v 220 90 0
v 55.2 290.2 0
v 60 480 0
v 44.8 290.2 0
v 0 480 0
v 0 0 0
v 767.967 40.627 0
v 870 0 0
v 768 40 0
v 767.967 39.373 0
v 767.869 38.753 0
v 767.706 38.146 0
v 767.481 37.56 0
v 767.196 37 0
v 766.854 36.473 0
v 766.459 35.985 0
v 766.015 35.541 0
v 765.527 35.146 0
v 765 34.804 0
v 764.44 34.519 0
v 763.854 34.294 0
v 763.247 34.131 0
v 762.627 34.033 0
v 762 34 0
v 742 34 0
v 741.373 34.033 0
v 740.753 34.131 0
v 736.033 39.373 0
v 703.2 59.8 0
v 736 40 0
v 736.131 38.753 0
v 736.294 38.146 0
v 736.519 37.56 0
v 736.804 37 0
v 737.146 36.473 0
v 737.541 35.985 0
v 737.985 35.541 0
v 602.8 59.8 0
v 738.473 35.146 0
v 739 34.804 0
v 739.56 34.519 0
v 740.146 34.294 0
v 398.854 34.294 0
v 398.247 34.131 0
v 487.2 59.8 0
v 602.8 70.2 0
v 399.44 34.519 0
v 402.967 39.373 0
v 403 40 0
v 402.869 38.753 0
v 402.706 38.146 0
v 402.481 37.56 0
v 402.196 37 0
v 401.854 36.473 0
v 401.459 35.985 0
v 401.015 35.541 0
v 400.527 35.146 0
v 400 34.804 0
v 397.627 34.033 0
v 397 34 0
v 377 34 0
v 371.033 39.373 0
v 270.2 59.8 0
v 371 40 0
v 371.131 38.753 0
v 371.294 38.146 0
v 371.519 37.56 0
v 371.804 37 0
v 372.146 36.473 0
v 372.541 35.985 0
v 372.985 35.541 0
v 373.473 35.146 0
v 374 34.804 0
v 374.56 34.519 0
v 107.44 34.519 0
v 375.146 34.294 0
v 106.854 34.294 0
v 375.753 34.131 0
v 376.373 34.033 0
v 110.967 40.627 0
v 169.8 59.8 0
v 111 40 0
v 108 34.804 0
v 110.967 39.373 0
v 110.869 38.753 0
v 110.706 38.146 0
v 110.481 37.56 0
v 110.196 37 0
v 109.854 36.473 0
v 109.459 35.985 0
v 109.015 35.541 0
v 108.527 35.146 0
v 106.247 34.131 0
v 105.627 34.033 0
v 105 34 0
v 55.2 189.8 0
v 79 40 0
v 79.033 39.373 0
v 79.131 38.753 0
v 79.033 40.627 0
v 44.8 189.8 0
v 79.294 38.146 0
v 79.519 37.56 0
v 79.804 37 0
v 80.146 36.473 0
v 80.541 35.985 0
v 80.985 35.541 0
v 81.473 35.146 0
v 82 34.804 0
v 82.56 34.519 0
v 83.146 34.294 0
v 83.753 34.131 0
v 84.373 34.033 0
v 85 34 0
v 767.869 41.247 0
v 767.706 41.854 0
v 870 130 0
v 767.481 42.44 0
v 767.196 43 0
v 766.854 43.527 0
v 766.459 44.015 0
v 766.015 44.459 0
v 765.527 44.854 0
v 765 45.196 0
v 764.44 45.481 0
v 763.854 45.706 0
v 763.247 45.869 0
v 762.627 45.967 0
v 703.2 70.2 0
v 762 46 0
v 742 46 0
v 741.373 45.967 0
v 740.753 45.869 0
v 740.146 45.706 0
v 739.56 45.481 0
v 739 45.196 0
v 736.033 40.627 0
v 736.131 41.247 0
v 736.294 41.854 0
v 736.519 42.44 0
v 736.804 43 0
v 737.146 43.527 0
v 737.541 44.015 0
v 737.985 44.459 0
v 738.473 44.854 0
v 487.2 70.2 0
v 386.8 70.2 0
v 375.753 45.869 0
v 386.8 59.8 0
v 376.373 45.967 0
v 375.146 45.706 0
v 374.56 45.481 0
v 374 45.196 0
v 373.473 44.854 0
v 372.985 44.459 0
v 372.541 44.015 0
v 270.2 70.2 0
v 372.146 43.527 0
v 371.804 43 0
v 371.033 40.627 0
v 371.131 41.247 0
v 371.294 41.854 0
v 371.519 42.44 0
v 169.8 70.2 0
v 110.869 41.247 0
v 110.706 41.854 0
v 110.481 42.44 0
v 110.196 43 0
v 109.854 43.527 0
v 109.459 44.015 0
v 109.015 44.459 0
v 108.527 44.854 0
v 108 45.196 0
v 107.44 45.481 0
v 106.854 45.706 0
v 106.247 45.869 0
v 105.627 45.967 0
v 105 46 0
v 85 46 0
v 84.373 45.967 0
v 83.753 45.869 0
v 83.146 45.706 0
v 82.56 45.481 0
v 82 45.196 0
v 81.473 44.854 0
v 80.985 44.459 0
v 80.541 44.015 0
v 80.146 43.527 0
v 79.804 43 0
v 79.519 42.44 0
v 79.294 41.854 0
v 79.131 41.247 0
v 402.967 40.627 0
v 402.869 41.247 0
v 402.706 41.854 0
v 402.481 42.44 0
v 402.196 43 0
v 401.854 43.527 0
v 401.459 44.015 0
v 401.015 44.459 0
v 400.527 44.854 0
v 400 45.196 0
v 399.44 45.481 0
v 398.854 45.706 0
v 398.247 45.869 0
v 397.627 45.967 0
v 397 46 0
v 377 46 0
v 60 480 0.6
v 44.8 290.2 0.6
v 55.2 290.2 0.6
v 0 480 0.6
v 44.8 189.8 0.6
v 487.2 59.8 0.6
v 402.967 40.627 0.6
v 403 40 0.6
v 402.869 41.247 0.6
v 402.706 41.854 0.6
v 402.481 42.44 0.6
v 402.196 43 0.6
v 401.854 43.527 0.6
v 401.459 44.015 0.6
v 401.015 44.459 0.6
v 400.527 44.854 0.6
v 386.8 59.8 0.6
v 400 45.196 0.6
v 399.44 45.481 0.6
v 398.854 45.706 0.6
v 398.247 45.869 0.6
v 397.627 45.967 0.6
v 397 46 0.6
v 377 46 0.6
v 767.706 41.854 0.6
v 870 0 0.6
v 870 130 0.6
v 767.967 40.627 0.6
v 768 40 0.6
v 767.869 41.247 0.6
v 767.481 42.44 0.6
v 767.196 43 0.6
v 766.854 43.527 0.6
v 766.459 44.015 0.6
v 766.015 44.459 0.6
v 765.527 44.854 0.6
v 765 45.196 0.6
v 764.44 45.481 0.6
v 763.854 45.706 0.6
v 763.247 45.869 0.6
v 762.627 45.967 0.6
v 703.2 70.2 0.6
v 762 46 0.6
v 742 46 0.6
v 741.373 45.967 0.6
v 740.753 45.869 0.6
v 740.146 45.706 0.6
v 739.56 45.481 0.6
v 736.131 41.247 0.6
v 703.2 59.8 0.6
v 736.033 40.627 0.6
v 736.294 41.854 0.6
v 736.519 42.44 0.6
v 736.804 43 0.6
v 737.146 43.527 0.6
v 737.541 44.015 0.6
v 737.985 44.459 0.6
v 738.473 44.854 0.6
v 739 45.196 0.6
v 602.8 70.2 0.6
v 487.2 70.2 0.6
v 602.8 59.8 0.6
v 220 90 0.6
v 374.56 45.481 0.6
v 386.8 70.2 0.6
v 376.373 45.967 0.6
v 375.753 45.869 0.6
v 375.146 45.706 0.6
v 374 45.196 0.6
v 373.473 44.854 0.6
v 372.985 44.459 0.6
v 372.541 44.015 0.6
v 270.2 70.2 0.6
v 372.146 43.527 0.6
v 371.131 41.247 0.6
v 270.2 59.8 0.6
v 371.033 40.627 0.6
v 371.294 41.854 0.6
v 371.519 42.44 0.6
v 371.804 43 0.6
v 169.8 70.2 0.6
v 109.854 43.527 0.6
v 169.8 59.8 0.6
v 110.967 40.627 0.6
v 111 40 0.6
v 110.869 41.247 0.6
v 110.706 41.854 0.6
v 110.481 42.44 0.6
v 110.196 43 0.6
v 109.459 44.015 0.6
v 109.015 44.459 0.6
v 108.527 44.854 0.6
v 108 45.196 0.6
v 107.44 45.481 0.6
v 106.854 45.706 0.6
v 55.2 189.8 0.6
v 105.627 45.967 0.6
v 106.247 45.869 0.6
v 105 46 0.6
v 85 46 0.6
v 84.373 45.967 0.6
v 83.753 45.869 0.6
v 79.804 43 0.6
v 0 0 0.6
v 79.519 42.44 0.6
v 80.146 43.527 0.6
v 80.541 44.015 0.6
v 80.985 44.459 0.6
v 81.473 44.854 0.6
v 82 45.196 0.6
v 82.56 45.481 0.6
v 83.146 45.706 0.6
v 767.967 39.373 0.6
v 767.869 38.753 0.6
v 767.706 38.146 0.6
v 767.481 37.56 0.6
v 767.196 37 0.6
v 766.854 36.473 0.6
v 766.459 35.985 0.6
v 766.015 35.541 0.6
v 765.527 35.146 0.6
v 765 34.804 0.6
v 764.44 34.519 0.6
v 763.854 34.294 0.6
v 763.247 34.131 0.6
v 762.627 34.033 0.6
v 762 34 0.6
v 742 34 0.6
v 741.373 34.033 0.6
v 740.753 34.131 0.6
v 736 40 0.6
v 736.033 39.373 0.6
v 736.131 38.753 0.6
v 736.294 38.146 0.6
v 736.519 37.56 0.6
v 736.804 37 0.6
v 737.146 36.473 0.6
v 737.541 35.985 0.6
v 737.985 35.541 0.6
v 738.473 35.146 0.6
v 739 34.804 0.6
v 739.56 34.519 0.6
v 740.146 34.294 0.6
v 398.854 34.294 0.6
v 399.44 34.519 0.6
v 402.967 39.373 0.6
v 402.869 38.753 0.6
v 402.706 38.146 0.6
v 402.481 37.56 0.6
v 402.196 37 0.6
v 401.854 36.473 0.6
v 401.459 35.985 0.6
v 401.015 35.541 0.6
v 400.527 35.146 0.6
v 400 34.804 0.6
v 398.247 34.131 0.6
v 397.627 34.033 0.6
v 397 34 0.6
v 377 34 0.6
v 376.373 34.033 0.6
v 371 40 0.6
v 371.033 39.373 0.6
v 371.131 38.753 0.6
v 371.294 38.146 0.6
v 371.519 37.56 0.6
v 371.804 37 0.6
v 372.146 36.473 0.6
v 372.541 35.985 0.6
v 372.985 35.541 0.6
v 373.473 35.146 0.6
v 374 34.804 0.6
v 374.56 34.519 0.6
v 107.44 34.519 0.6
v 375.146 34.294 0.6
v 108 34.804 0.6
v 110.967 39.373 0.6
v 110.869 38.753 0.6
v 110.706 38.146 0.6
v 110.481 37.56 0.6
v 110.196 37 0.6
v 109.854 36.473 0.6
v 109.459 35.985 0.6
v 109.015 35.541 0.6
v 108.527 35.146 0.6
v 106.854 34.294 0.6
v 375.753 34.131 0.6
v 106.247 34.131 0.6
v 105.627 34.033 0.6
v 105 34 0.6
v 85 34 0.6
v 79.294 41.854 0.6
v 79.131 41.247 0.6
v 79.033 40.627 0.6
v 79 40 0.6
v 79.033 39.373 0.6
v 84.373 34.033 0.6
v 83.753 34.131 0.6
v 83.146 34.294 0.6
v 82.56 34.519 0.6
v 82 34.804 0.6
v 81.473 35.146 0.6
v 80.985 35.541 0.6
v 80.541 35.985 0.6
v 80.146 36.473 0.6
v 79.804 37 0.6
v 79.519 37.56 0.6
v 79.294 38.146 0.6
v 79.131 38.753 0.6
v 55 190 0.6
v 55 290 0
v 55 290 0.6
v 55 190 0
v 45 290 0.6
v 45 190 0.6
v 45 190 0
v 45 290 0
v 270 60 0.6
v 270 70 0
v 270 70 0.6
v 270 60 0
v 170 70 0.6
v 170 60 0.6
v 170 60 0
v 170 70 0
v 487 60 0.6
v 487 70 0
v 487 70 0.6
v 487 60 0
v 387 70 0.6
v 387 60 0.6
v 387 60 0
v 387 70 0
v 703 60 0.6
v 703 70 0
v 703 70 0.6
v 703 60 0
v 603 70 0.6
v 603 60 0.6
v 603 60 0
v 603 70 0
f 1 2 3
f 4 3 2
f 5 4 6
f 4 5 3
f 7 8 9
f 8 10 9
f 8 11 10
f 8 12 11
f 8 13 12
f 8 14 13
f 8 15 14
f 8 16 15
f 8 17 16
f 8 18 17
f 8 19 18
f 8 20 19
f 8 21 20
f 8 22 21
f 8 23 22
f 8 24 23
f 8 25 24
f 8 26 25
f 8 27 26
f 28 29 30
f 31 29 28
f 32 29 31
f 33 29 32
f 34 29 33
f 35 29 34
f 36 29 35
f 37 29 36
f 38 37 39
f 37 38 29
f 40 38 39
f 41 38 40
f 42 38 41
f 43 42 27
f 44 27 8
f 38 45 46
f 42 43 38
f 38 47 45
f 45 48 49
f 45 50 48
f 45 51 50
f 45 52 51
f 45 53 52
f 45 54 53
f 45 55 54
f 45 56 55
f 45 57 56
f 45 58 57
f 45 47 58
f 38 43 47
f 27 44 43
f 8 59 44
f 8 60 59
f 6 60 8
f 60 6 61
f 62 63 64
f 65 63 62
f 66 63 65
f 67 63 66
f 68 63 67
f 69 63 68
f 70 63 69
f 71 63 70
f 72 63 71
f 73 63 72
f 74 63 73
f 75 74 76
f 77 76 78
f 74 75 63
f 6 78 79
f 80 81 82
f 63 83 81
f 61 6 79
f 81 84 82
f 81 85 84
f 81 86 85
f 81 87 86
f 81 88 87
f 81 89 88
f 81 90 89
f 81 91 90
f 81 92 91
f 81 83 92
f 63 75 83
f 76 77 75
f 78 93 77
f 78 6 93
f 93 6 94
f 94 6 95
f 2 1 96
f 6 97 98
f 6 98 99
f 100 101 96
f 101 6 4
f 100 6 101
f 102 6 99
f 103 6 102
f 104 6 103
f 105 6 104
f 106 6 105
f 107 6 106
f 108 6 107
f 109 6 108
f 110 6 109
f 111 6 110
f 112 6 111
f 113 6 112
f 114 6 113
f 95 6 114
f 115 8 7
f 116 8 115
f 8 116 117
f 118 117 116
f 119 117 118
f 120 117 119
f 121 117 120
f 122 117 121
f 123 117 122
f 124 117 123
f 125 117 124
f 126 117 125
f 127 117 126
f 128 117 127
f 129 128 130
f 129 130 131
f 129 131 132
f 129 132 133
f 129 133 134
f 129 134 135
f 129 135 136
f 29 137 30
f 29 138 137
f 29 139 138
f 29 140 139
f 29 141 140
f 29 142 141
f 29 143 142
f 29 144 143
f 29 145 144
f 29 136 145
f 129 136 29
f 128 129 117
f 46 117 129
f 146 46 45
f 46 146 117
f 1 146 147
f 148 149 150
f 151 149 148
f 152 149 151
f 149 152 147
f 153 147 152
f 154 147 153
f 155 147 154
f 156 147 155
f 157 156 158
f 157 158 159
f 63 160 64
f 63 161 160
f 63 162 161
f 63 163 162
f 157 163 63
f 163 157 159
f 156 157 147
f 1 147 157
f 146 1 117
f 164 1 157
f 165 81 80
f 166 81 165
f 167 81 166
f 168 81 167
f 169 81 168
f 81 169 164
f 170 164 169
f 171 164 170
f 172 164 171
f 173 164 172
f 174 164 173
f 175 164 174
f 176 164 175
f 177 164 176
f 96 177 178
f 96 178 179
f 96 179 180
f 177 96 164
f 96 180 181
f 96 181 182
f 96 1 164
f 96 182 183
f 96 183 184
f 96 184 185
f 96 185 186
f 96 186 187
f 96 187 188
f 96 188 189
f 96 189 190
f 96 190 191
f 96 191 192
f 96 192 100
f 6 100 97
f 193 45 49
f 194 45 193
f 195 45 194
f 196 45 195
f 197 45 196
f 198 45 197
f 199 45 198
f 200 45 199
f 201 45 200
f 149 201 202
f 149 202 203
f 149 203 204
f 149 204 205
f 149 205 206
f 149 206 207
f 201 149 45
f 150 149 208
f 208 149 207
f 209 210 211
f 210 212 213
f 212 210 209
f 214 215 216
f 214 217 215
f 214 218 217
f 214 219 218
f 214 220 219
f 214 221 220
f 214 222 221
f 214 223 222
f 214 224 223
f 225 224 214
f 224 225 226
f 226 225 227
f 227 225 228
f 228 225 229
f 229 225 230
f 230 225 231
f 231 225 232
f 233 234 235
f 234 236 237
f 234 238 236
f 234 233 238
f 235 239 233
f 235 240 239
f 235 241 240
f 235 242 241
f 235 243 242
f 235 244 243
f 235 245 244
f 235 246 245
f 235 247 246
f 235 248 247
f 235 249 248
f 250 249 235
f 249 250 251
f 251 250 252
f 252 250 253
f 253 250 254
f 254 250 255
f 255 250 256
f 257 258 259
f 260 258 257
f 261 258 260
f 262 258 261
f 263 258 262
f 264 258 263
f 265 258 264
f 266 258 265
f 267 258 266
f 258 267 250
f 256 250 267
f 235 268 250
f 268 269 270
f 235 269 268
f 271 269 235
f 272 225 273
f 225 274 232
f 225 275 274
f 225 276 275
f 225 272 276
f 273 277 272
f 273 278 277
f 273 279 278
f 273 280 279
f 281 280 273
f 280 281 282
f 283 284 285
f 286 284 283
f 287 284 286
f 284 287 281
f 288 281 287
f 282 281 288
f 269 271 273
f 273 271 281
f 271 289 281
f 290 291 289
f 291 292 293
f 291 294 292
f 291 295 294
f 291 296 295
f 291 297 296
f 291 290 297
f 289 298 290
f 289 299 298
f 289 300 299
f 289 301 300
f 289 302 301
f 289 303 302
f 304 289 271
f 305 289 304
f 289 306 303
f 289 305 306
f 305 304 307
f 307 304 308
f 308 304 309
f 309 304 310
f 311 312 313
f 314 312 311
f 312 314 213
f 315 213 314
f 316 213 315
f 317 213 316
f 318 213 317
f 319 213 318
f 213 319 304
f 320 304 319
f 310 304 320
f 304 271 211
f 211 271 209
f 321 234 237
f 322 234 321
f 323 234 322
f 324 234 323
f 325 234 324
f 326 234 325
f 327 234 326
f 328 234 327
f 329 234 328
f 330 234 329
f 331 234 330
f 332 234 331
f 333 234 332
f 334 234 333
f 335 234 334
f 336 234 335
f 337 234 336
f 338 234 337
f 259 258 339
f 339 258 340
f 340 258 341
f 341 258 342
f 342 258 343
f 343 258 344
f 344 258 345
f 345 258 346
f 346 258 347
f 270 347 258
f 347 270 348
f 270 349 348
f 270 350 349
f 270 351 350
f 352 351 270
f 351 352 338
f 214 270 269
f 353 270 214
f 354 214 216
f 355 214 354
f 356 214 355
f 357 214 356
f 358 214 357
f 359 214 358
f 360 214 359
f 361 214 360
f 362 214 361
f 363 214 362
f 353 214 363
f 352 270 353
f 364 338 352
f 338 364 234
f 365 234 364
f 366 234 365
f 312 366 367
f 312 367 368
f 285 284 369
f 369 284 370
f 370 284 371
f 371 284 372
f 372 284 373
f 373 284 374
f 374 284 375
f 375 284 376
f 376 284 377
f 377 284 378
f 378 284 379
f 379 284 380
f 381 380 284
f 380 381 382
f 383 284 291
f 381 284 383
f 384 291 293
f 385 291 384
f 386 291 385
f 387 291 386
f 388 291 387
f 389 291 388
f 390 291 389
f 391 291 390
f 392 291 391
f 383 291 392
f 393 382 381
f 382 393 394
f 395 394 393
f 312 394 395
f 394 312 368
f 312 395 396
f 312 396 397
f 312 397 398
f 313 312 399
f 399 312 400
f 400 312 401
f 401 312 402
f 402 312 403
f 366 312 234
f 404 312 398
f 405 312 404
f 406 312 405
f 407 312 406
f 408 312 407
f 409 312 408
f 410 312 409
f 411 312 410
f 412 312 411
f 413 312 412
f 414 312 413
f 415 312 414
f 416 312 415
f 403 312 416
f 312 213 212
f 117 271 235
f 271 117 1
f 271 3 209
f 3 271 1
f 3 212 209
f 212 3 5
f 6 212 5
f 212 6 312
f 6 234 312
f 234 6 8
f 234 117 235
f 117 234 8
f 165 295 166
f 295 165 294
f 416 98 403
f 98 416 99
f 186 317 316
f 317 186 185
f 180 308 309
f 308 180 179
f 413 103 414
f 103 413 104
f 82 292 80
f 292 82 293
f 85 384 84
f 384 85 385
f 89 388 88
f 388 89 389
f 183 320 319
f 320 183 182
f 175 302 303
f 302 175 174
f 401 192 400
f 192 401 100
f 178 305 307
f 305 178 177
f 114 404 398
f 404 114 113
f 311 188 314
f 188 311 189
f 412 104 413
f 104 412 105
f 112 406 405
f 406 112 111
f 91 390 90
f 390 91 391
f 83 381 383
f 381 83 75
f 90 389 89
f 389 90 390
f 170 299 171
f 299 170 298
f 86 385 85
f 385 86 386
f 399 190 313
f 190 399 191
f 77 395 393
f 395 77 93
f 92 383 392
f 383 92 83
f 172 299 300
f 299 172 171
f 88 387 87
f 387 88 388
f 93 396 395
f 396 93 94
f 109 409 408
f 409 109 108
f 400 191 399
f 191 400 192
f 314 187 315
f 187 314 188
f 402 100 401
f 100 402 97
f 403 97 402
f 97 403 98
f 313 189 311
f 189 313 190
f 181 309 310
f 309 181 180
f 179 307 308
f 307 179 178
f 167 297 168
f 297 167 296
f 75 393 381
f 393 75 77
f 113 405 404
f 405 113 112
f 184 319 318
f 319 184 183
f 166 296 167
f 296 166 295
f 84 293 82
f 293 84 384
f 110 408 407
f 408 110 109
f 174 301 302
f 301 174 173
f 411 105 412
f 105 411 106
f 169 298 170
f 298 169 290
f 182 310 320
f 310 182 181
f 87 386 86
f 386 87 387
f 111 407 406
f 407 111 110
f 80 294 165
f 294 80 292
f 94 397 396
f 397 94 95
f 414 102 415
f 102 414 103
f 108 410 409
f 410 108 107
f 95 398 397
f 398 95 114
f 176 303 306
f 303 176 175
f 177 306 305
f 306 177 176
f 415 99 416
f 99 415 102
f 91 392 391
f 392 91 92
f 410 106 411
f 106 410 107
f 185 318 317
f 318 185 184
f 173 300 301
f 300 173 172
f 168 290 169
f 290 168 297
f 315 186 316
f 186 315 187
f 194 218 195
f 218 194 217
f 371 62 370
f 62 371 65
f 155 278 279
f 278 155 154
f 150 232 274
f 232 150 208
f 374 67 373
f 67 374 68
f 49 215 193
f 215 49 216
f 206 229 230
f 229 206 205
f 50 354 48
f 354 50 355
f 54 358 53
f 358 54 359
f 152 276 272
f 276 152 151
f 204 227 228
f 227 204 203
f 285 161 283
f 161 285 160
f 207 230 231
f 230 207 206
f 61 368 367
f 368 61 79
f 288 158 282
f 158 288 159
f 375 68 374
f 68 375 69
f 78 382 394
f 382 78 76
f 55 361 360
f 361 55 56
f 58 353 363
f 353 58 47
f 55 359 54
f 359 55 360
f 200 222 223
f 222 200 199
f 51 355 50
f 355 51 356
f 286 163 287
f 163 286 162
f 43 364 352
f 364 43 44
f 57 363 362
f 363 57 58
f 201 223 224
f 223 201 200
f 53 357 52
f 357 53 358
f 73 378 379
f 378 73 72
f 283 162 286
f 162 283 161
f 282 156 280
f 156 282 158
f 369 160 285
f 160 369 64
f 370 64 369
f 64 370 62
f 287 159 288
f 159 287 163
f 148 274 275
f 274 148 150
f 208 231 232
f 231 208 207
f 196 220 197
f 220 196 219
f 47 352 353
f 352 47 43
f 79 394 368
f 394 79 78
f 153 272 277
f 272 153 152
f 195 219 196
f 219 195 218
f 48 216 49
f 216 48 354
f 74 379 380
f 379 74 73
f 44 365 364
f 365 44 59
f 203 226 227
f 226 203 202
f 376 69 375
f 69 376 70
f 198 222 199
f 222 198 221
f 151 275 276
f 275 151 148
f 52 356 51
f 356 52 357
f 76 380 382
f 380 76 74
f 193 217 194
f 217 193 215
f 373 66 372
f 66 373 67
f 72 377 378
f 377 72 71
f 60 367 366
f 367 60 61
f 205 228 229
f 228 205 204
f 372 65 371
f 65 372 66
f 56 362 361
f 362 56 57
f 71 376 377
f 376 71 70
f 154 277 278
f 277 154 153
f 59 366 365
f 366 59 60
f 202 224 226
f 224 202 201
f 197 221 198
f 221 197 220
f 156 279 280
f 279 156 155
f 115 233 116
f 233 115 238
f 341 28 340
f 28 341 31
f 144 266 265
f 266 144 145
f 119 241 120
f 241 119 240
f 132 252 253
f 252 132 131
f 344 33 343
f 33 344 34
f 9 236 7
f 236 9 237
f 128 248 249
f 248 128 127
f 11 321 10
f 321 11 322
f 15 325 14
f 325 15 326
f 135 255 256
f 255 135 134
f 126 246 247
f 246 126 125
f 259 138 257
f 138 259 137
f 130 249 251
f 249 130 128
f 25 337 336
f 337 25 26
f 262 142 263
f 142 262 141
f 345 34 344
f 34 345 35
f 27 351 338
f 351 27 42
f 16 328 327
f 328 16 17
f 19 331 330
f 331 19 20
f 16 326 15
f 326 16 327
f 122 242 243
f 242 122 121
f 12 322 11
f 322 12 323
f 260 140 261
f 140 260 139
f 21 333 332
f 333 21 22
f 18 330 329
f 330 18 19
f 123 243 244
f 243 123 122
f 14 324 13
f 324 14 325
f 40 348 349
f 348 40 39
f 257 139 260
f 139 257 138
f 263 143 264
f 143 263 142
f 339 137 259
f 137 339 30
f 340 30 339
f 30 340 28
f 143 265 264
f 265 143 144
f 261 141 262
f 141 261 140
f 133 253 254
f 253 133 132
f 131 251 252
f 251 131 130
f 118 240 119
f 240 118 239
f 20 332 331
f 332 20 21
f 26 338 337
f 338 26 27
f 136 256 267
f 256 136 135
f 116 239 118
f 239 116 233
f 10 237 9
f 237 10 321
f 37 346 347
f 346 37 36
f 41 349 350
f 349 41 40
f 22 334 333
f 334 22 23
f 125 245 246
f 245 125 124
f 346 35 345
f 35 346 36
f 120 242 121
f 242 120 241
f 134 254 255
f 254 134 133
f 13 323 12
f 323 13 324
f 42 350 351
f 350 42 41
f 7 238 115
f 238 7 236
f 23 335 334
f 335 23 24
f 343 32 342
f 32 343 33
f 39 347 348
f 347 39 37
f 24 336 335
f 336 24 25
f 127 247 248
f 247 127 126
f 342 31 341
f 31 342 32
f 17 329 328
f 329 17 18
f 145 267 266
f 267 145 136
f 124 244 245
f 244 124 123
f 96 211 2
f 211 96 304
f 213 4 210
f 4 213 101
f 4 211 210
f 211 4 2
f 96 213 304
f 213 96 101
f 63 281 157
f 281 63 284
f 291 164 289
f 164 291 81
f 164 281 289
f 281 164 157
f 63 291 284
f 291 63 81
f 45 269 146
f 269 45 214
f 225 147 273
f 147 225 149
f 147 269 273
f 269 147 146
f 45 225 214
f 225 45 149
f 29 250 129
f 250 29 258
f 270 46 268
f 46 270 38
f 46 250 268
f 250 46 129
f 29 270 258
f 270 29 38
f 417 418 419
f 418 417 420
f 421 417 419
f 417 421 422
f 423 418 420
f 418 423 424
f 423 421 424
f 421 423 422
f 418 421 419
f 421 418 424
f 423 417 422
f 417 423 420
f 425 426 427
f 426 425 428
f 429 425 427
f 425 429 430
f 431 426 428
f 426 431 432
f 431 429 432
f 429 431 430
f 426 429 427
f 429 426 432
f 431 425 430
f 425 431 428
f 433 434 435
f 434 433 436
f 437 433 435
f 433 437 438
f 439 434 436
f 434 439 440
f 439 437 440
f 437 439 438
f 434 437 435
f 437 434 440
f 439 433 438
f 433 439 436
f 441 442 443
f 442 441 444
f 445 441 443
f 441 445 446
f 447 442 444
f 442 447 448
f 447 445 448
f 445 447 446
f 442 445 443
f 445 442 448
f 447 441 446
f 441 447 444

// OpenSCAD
// ==========================================
// Custom Sofa Side - Parametric & Split Model
// ==========================================
// This model represents a custom L-shaped sofa side plate with sloped internal edges
// and three parametric screw holes for fixation.
//
// Sliced into 5 printable pieces that fit on a 260mm x 260mm printer bed.
// Assembly system uses 4 connection bars in total:
// - 1 bar for the top part (horizontal cut, left/X=50 slot)
// - 3 bars for the bottom parts (vertical cuts, Y=65 slots)
// All dimensions are in millimeters (mm).
//
// You can customize the parameters and choose which part to render below.

/* [Visualization & Rendering] */
// Select which part to display/export
show_part = 0; // [0:All Assembled, 1:Part 1, 2:Part 2, 3:Part 3, 4:Part 4, 5:Part 5, 6:Exploded View]

// Separation distance for the exploded view (when show_part = 6)
explode_distance = 60; // [0:200]

/* [Main Dimensions] */
// Thickness of the sofa side plate and the connection bars
thickness = .6; // [5:100]

// Total width of the bottom edge
bottom_width = 870;

// Total height of the left edge
total_height = 480;

// Width of the horizontal flat section at the top of the backrest
top_width = 60;

// Horizontal span of the backrest slope
slope_span_x = 160;

// Vertical drop of the backrest slope
slope_drop_y = 390;

// Height of the right vertical edge (above the base)
right_height = 130;

/* [Screw Holes] */
// Diameter of the screw holes
hole_diameter = 12;

// Horizontal adjustment range of the slots
slot_length = 20;

// Height of the screw holes from the bottom edge
hole_y = 40;

// X-coordinate of the first (leftmost) hole
hole_1_x = 95;

// Distance from the first hole to the middle hole
hole_1_to_2_distance = 292;

// Distance from the first hole to the rightmost hole
hole_1_to_3_distance = 657;

/* [Alignment Bars & Slots] */
// Width of the flat alignment bars
bar_width = 10;

// Length of the flat alignment bars
bar_length = 100;

// Tolerance/clearance around the bar in the slot (3D printing clearance)
bar_tolerance = 0.2;

// X-coordinate of the single backrest connector (left side of Cut 1)
connector_x = 50;

/* [Internal Splitting Parameters] */
// X-coordinate where the backrest is split from the seat
cut_x_left = 220;

// Y-coordinate where the backrest is split horizontally
cut_y_back = 240;

// First X-coordinate splitting the seat
cut_x_seat1 = 437; // 220 + (870-220)/3 ≈ 437

// Second X-coordinate splitting the seat
cut_x_seat2 = 653; // 220 + 2*(870-220)/3 ≈ 653

// Number of fragments for circular holes (smoothness)
$fn = 60;

// 2D Profile of the Sofa Side
module sofa_side_2d() {
    points = [
        [0, 0],                                      // A: Bottom-left corner
        [bottom_width, 0],                           // B: Bottom-right corner
        [bottom_width, right_height],                // C: Top of the right vertical edge
        [top_width + slope_span_x, total_height - slope_drop_y], // D: Bottom of the backrest slope
        [top_width, total_height],                   // E: Top of the backrest slope
        [0, total_height]                            // F: Top-left corner
    ];
    
    polygon(points);
}

// Helper module for a rounded adjustment slot (horizontal)
module screw_hole_slot(x, y) {
    translate([x, y, -0.05]) {
        hull() {
            translate([-slot_length / 2, 0, 0])
                cylinder(d = hole_diameter, h = thickness + 0.1);
            translate([slot_length / 2, 0, 0])
                cylinder(d = hole_diameter, h = thickness + 0.1);
        }
    }
}

// 3D Extruded Plate with Screw Holes (Solid, uncut)
module sofa_side_3d() {
    difference() {
        // Extrude the 2D profile
        linear_extrude(height = thickness, center = false) {
            sofa_side_2d();
        }
        
        // Subtract the three screw holes (as rounded slots for adjustment)
        screw_hole_slot(hole_1_x, hole_y);
        screw_hole_slot(hole_1_x + hole_1_to_2_distance, hole_y);
        screw_hole_slot(hole_1_x + hole_1_to_3_distance, hole_y);
    }
}

// Alignment Bar Indents/Slots module
// Subtracts pockets from the cut faces. Pockets include the bar_tolerance on all sides.
module all_indents() {
    t_w = bar_width + 2 * bar_tolerance;
    t_l = bar_length + 2 * bar_tolerance;
    t_h = thickness + 0.2;
    
    // Cut 1: Only 1 vertical bar crossing Y = cut_y_back (on the left side, X = connector_x)
    translate([connector_x - t_w/2, cut_y_back - t_l/2, -0.1])
        cube([t_w, t_l, t_h]);
        
    // Cut 2: One horizontal bar crossing X = cut_x_left (at Y = 65)
    translate([cut_x_left - t_l/2, 65 - t_w/2, -0.1])
        cube([t_l, t_w, t_h]);
        
    // Cut 3: One horizontal bar crossing X = cut_x_seat1 (at Y = 65)
    translate([cut_x_seat1 - t_l/2, 65 - t_w/2, -0.1])
        cube([t_l, t_w, t_h]);

    // Cut 4: One horizontal bar crossing X = cut_x_seat2 (at Y = 65)
    translate([cut_x_seat2 - t_l/2, 65 - t_w/2, -0.1])
        cube([t_l, t_w, t_h]);
}

// --- MODULES FOR INDIVIDUAL PIECES ---

// Part 1: Top Left backrest (Fits in 220mm x 240mm)
module part1() {
    color("LightCoral")
    difference() {
        intersection() {
            sofa_side_3d();
            // Bounding box for Part 1 (Top Left)
            translate([-50, cut_y_back, -50])
                cube([cut_x_left + 50, total_height - cut_y_back + 100, thickness + 100]);
        }
        all_indents();
    }
}

// Part 2: Bottom Left backrest base (Fits in 220mm x 240mm)
module part2() {
    color("LightGreen")
    difference() {
        intersection() {
            sofa_side_3d();
            // Bounding box for Part 2 (Bottom Left)
            translate([-50, -50, -50])
                cube([cut_x_left + 50, cut_y_back + 50, thickness + 100]);
        }
        all_indents();
    }
}

// Part 3: Seat Left section (Fits in 217mm x 130mm)
module part3() {
    color("LightBlue")
    difference() {
        intersection() {
            sofa_side_3d();
            // Bounding box for Part 3 (Seat Left)
            translate([cut_x_left, -50, -50])
                cube([cut_x_seat1 - cut_x_left, total_height + 100, thickness + 100]);
        }
        all_indents();
    }
}

// Part 4: Seat Middle section (Fits in 216mm x 130mm)
module part4() {
    color("LightGoldenrodYellow")
    difference() {
        intersection() {
            sofa_side_3d();
            // Bounding box for Part 4 (Seat Middle)
            translate([cut_x_seat1, -50, -50])
                cube([cut_x_seat2 - cut_x_seat1, total_height + 100, thickness + 100]);
        }
        all_indents();
    }
}

// Part 5: Seat Right section (Fits in 217mm x 130mm)
module part5() {
    color("Plum")
    difference() {
        intersection() {
            sofa_side_3d();
            // Bounding box for Part 5 (Seat Right)
            translate([cut_x_seat2, -50, -50])
                cube([bottom_width - cut_x_seat2 + 50, total_height + 100, thickness + 100]);
        }
        all_indents();
    }
}

// --- PRINTABLE GROUPINGS (PART + 1 BAR FOR PARTS 1, 3, 4, AND 5) ---

module part1_printable() {
    part1();
    // Place 1 vertical bar for Cut 1
    translate([cut_x_left + 10, cut_y_back, 0])
        color("DarkOrange") cube([bar_width, bar_length, thickness]);
}

module part2_printable() {
    part2(); // No bar printed with Part 2 (yields exactly 4 bars total)
}

module part3_printable() {
    // Translate Part 3 to start at local origin X=0, but Y=20 to leave space for the bar below
    translate([-cut_x_left, 20, 0])
        part3();
    // Place 1 horizontal bar for Cut 2
    translate([0, 0, 0])
        color("DarkOrange") cube([bar_length, bar_width, thickness]);
}

module part4_printable() {
    // Translate Part 4 to start at local origin X=0, but Y=20 to leave space for the bar below
    translate([-cut_x_seat1, 20, 0])
        part4();
    // Place 1 horizontal bar for Cut 3
    translate([0, 0, 0])
        color("DarkOrange") cube([bar_length, bar_width, thickness]);
}

module part5_printable() {
    // Translate Part 5 to start at local origin X=0, but Y=20 to leave space for the bar below
    translate([-cut_x_seat2, 20, 0])
        part5();
    // Place 1 horizontal bar for Cut 4
    translate([0, 0, 0])
        color("DarkOrange") cube([bar_length, bar_width, thickness]);
}

// --- DISPLAY LOGIC ---

if (show_part == 0) {
    // Show all parts assembled
    part1();
    part2();
    part3();
    part4();
    part5();
    
    // Render the 4 alignment bars inside the slots
    // Bar 1 (Cut 1 left)
    translate([connector_x - bar_width/2, cut_y_back - bar_length/2, 0])
        color("DarkOrange") cube([bar_width, bar_length, thickness]);
    // Bar 2 (Cut 2 horizontal)
    translate([cut_x_left - bar_length/2, 65 - bar_width/2, 0])
        color("DarkOrange") cube([bar_length, bar_width, thickness]);
    // Bar 3 (Cut 3 horizontal)
    translate([cut_x_seat1 - bar_length/2, 65 - bar_width/2, 0])
        color("DarkOrange") cube([bar_length, bar_width, thickness]);
    // Bar 4 (Cut 4 horizontal)
    translate([cut_x_seat2 - bar_length/2, 65 - bar_width/2, 0])
        color("DarkOrange") cube([bar_length, bar_width, thickness]);
        
} else if (show_part == 1) {
    // Part 1: Top Left with 1 vertical bar, centered for build plate
    translate([-120, -360, 0])
        part1_printable();
        
} else if (show_part == 2) {
    // Part 2: Bottom Left, centered for build plate
    translate([-cut_x_left/2, -cut_y_back/2, 0])
        part2_printable();
        
} else if (show_part == 3) {
    // Part 3: Seat Left with 1 horizontal bar, centered
    translate([-(cut_x_seat1 - cut_x_left)/2, -75, 0])
        part3_printable();
        
} else if (show_part == 4) {
    // Part 4: Seat Middle with 1 horizontal bar, centered
    translate([-(cut_x_seat2 - cut_x_seat1)/2, -75, 0])
        part4_printable();
        
} else if (show_part == 5) {
    // Part 5: Seat Right with 1 horizontal bar, centered
    translate([-(bottom_width - cut_x_seat2)/2, -75, 0])
        part5_printable();
        
} else if (show_part == 6) {
    // Exploded view showing fitment and alignment bars
    translate([0, explode_distance, 0]) part1();
    translate([0, 0, 0]) part2();
    translate([explode_distance, 0, 0]) part3();
    translate([explode_distance * 2, 0, 0]) part4();
    translate([explode_distance * 3, 0, 0]) part5();
    
    // Bars floated in the middle of cuts
    // Bar 1 (between Part 1 and Part 2, floated at Y = cut_y_back + explode_distance / 2)
    translate([connector_x - bar_width/2, cut_y_back - bar_length/2 + explode_distance / 2, 0])
        color("DarkOrange") cube([bar_width, bar_length, thickness]);
        
    // Bar 2 (between Part 2 and Part 3, floated at X = cut_x_left + explode_distance / 2)
    translate([cut_x_left - bar_length/2 + explode_distance / 2, 65 - bar_width/2, 0])
        color("DarkOrange") cube([bar_length, bar_width, thickness]);
        
    // Bar 3 (between Part 3 and Part 4, floated at X = cut_x_seat1 + explode_distance * 1.5)
    translate([cut_x_seat1 - bar_length/2 + explode_distance * 1.5, 65 - bar_width/2, 0])
        color("DarkOrange") cube([bar_length, bar_width, thickness]);

    // Bar 4 (between Part 4 and Part 5, floated at X = cut_x_seat2 + explode_distance * 2.5)
    translate([cut_x_seat2 - bar_length/2 + explode_distance * 2.5, 65 - bar_width/2, 0])
        color("DarkOrange") cube([bar_length, bar_width, thickness]);
}
